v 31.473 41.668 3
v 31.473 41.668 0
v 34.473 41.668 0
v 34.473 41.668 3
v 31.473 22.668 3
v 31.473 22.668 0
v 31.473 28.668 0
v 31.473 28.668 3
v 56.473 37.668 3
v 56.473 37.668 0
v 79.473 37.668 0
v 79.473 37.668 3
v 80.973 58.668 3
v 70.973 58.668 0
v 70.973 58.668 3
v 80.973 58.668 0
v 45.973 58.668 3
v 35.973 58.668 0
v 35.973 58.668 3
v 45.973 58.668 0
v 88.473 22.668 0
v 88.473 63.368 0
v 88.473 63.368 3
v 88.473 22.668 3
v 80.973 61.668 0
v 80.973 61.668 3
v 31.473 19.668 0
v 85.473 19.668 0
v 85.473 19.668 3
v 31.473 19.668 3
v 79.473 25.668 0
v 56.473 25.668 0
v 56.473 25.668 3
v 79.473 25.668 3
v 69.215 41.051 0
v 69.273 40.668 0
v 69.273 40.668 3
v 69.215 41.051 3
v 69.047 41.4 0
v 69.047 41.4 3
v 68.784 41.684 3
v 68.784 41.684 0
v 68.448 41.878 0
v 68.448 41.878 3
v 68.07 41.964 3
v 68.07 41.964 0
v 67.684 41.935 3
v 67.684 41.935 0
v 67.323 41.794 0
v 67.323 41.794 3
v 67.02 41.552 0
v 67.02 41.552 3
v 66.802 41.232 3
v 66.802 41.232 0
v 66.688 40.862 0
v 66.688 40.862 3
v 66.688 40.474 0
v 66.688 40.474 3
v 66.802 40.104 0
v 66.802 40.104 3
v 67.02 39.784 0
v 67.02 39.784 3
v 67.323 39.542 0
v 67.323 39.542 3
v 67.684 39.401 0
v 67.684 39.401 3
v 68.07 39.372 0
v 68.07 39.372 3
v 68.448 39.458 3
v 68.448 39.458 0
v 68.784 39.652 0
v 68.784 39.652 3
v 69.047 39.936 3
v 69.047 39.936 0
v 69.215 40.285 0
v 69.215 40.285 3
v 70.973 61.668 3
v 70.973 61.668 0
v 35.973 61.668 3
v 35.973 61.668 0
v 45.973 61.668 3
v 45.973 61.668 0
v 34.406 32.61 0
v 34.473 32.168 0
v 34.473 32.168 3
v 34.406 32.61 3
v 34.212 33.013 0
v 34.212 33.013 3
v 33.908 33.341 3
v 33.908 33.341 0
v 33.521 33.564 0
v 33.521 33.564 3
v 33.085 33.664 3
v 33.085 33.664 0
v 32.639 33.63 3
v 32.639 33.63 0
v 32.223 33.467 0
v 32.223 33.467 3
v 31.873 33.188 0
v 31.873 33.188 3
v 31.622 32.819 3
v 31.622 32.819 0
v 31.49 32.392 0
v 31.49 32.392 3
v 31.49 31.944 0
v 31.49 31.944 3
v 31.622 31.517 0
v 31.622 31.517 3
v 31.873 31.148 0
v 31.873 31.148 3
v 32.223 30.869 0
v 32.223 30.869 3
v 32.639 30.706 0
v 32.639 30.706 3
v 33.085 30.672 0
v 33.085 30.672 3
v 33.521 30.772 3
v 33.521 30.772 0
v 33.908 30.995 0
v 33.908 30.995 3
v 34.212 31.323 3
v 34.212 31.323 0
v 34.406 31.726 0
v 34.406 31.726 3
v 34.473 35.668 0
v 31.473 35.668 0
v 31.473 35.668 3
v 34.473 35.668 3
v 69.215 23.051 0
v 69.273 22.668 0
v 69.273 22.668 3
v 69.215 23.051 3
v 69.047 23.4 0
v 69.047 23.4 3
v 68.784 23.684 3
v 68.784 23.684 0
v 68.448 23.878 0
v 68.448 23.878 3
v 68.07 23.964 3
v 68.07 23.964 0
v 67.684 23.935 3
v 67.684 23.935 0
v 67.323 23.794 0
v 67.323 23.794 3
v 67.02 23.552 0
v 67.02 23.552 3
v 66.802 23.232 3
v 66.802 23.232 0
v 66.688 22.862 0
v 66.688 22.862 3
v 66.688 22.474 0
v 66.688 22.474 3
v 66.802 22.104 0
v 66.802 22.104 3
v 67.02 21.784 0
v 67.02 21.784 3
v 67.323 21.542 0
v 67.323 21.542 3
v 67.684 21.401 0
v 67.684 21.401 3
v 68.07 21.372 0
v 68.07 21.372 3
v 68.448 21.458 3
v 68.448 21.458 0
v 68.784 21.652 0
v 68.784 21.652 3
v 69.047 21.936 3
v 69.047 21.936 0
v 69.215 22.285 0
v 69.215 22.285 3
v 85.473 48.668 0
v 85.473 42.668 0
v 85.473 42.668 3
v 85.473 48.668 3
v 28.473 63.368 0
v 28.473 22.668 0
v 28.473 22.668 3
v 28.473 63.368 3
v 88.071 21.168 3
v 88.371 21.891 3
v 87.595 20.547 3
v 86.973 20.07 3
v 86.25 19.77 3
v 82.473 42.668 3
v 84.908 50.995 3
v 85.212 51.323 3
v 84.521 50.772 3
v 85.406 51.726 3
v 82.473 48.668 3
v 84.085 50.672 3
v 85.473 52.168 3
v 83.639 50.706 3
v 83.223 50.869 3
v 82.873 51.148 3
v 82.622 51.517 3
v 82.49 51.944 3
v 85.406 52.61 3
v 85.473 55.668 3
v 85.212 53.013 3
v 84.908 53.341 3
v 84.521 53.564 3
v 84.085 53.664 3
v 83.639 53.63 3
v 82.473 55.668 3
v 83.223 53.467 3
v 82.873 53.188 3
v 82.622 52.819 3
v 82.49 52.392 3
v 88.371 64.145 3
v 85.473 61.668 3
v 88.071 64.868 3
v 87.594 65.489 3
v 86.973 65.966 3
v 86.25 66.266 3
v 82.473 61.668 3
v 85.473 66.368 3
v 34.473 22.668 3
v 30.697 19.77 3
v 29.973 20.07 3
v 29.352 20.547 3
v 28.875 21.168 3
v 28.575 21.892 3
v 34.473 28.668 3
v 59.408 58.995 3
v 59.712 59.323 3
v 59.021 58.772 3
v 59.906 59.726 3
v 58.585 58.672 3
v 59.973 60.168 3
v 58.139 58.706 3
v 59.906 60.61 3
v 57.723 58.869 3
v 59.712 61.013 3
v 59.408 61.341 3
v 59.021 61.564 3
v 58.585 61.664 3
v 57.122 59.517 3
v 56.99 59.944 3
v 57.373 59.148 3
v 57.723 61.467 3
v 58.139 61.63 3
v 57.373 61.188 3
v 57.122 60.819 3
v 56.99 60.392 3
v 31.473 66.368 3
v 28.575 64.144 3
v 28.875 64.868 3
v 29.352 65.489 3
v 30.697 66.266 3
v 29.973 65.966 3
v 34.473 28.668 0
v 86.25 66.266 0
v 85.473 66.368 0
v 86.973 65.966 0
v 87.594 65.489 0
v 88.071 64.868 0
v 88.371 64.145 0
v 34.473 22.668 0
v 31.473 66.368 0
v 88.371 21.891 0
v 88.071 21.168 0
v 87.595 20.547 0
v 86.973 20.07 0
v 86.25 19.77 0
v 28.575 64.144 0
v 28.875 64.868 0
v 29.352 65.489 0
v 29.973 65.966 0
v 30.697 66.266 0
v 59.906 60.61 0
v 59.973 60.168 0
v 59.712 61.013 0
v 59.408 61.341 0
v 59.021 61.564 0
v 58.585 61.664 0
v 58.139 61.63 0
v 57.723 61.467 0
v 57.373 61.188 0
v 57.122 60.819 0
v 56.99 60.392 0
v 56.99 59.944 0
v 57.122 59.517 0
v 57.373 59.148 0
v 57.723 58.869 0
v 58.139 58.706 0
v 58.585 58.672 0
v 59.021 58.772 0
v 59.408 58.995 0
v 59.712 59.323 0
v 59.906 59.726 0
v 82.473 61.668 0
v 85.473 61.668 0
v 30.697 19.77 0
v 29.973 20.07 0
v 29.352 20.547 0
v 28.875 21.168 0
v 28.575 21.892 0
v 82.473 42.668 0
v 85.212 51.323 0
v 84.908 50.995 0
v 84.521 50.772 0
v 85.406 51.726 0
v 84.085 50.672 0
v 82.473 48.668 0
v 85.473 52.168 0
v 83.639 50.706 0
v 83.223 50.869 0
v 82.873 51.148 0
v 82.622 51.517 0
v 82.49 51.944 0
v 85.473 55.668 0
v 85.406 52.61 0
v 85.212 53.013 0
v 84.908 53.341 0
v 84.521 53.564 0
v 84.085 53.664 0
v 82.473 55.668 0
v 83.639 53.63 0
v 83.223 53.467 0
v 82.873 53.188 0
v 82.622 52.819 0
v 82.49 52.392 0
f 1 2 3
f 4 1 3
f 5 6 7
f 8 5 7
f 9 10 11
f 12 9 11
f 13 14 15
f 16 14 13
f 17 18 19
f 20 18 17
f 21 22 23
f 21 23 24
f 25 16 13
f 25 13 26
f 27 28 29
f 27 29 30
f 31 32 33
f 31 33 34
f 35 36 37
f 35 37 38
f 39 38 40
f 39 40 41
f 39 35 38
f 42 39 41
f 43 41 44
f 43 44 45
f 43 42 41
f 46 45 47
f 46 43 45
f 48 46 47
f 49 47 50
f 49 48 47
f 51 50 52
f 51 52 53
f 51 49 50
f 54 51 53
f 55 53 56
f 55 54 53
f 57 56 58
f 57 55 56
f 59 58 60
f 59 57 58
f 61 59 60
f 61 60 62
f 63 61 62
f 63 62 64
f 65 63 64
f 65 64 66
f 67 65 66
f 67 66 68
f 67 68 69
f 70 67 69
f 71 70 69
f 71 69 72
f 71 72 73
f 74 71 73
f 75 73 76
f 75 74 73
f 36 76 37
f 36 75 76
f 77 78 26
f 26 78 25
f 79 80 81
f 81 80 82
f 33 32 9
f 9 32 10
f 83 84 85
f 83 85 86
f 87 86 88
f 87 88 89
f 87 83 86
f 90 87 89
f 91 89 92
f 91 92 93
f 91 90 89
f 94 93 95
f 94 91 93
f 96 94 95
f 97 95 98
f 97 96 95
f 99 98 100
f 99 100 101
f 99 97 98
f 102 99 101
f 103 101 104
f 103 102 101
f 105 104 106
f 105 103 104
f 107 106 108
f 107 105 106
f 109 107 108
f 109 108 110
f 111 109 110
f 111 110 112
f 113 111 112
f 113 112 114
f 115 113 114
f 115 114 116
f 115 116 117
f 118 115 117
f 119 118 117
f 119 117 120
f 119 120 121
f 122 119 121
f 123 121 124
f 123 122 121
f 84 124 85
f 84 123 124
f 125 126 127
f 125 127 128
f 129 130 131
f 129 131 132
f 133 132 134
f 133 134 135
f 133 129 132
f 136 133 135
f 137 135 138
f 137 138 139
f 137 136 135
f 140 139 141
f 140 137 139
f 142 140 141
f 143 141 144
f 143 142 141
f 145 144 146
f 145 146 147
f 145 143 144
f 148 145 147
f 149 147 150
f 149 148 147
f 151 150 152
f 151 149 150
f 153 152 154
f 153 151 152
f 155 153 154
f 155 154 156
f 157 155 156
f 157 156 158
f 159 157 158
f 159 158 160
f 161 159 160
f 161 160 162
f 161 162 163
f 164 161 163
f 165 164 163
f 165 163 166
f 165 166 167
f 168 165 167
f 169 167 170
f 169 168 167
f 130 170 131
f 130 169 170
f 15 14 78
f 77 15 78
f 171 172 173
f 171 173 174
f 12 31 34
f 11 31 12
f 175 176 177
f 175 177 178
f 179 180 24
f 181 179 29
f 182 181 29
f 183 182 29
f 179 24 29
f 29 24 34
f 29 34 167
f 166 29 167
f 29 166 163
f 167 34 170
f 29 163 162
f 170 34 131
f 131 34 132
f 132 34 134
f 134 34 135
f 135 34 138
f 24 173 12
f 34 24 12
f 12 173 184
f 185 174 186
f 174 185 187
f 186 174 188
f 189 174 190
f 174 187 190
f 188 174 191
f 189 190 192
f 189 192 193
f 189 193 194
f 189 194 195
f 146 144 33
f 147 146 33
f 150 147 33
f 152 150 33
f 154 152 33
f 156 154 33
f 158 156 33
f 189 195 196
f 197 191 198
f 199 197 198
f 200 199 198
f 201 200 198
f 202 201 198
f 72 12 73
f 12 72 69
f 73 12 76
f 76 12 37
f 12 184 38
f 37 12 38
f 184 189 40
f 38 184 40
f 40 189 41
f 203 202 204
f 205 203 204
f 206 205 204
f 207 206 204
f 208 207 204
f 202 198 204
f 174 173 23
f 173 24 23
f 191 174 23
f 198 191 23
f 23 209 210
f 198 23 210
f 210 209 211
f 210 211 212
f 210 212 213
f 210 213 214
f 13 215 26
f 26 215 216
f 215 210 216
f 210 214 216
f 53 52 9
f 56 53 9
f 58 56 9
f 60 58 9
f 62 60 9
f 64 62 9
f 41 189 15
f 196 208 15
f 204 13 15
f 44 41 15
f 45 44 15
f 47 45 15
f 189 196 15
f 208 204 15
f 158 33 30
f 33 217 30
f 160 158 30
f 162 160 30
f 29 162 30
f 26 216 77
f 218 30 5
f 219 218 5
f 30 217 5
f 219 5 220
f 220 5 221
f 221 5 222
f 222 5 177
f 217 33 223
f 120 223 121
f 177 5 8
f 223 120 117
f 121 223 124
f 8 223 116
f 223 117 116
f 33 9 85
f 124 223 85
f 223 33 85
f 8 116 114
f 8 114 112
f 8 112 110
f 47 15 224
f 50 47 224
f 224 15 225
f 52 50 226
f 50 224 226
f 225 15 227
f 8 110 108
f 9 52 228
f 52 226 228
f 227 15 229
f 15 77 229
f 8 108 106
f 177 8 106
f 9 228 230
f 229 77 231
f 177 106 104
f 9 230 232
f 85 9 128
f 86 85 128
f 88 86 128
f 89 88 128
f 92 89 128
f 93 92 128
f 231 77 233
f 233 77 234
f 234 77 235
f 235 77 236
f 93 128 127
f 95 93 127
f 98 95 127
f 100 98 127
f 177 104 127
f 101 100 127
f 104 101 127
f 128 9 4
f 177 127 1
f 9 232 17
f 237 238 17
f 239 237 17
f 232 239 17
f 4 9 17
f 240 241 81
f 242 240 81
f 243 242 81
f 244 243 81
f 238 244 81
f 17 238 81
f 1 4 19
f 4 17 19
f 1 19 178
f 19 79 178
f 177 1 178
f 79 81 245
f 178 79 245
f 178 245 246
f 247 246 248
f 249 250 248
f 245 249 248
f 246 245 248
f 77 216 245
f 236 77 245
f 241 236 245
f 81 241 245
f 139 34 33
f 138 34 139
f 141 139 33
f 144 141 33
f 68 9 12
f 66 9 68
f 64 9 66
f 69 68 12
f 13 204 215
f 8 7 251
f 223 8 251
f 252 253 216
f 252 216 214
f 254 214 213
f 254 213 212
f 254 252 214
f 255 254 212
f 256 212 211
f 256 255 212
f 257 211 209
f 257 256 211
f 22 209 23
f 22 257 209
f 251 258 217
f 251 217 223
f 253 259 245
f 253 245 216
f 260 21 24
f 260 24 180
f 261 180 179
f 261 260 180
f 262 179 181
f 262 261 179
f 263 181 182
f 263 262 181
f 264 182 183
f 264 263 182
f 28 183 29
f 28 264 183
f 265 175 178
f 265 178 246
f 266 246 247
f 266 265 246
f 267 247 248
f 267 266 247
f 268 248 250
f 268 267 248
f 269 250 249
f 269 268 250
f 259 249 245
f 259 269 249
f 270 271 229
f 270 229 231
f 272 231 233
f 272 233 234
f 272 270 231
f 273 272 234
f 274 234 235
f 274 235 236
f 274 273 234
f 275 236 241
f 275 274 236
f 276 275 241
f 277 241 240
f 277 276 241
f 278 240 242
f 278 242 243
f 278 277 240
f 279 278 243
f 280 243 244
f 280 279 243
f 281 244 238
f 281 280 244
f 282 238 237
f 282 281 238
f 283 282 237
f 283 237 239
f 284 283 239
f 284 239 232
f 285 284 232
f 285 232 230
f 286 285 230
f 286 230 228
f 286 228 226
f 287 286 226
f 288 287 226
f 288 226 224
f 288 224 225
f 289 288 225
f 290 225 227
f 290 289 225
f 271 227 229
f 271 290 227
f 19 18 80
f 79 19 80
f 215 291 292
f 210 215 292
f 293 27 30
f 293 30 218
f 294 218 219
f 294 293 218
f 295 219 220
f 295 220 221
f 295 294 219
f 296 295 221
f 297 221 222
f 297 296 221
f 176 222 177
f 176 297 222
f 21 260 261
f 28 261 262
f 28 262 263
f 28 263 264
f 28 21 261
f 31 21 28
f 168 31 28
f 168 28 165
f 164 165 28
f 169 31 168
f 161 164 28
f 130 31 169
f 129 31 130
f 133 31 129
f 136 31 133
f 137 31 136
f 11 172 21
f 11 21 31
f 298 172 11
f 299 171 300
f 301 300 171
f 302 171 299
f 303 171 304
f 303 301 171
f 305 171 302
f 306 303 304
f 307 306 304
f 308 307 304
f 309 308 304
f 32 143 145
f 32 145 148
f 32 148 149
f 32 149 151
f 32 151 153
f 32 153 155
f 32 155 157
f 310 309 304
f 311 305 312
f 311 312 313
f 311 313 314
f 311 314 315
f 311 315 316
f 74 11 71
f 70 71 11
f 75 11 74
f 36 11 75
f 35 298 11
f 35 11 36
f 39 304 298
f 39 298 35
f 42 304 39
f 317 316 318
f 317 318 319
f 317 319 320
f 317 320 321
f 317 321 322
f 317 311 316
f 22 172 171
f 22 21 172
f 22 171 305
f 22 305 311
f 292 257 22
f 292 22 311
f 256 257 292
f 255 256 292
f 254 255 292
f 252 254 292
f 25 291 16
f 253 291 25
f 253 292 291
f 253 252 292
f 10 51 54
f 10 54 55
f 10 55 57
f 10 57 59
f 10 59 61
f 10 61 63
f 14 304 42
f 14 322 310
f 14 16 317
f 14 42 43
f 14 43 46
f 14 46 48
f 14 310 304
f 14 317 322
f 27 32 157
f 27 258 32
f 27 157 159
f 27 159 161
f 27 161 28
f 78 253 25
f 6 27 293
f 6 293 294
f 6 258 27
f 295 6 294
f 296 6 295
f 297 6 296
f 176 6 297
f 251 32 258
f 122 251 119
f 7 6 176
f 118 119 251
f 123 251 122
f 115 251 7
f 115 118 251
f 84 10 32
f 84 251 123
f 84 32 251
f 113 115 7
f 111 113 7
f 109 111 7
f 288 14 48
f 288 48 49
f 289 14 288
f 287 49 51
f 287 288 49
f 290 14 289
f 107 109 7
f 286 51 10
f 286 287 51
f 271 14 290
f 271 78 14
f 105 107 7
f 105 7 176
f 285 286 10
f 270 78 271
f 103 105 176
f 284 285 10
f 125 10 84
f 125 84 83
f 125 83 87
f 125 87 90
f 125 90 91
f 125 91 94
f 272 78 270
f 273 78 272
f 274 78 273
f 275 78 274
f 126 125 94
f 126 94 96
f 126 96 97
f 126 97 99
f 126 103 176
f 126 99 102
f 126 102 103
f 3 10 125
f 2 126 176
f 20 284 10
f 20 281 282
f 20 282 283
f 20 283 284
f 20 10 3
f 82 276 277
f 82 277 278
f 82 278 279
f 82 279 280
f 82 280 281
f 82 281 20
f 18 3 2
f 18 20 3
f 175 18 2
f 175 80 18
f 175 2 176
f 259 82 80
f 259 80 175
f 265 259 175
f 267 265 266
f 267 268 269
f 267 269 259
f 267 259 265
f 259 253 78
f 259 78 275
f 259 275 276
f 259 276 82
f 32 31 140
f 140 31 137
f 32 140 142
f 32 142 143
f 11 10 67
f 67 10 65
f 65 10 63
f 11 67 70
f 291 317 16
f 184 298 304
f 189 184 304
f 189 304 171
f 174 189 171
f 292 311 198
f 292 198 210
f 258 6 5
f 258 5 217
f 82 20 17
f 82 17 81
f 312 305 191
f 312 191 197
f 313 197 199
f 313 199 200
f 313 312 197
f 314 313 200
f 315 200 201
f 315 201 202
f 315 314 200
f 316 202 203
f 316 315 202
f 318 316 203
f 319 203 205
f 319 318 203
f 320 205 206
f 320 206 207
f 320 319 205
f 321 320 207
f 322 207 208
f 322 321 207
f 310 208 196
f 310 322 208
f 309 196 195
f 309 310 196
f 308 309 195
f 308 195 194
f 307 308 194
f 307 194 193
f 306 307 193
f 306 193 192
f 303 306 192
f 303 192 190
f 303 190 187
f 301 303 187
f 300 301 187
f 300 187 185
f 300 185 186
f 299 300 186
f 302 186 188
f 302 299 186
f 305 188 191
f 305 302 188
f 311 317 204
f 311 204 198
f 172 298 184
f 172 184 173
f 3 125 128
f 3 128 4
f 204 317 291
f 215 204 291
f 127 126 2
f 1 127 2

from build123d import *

# Parameters (mm, degrees)
MODEL_R             = 1.500000002
MODEL_R_2           = 1.300000002
MODEL_R_3           = 1.500000003
MODEL_W             = 3
MODEL_H             = 6
MODEL_W_2           = 10
MODEL_H_2           = 3
MODEL_W_3           = 23
MODEL_H_3           = 12
BOSS_EXTRUDE1_DEPTH = 3


with BuildPart() as part:
    # Model → Boss-Extrude1 (new body)
    with BuildSketch(Plane.XY):
        with BuildLine():
            Line((28.47306014, 22.66800001), (28.473164499, 63.3680236))
            ThreePointArc((28.473164499, 63.3680236), (29.351812484, 65.489297995), (31.473064499, 66.36800001))
            Line((31.473064499, 66.36800001), (85.473064499, 66.36800001))
            ThreePointArc((85.473064499, 66.36800001), (87.594368353, 65.489496156), (88.473064511, 63.368271953))
            Line((88.473064511, 63.368271953), (88.473064511, 22.66800001))
            ThreePointArc((88.473064511, 22.66800001), (87.594512967, 20.546548464), (85.47306014, 19.66800001))
            Line((85.47306014, 19.66800001), (31.47306014, 19.66800001))
            ThreePointArc((31.47306014, 19.66800001), (29.351710139, 20.54665001), (28.47306014, 22.66800001))
        make_face()
        with Locations((32.973060142, 32.168000012)):
            Circle(MODEL_R, mode=Mode.SUBTRACT)
        with Locations((58.473060142, 60.168000012)):
            Circle(MODEL_R, mode=Mode.SUBTRACT)
        with Locations((67.973060142, 22.668000012)):
            Circle(MODEL_R_2, mode=Mode.SUBTRACT)
        with Locations((67.973060142, 40.668000012)):
            Circle(MODEL_R_2, mode=Mode.SUBTRACT)
        with Locations((83.97306014, 52.16800001)):
            Circle(MODEL_R_3, mode=Mode.SUBTRACT)
        with Locations((32.97306014, 38.66800001)):
            Rectangle(MODEL_W, MODEL_H, mode=Mode.SUBTRACT)
        with Locations((40.97306014, 60.16800001)):
            Rectangle(MODEL_W_2, MODEL_H_2, mode=Mode.SUBTRACT)
        with Locations((32.97306014, 25.66800001)):
            Rectangle(MODEL_W, MODEL_H, mode=Mode.SUBTRACT)
        with Locations((75.97306014, 60.16800001)):
            Rectangle(MODEL_W_2, MODEL_H_2, mode=Mode.SUBTRACT)
        with Locations((83.97306014, 58.66800001)):
            Rectangle(MODEL_W, MODEL_H, mode=Mode.SUBTRACT)
        with Locations((83.97306014, 45.66800001)):
            Rectangle(MODEL_W, MODEL_H, mode=Mode.SUBTRACT)
        with Locations((67.97306014, 31.66800001)):
            Rectangle(MODEL_W_3, MODEL_H_3, mode=Mode.SUBTRACT)
    extrude(amount=BOSS_EXTRUDE1_DEPTH)


solid = part.part
